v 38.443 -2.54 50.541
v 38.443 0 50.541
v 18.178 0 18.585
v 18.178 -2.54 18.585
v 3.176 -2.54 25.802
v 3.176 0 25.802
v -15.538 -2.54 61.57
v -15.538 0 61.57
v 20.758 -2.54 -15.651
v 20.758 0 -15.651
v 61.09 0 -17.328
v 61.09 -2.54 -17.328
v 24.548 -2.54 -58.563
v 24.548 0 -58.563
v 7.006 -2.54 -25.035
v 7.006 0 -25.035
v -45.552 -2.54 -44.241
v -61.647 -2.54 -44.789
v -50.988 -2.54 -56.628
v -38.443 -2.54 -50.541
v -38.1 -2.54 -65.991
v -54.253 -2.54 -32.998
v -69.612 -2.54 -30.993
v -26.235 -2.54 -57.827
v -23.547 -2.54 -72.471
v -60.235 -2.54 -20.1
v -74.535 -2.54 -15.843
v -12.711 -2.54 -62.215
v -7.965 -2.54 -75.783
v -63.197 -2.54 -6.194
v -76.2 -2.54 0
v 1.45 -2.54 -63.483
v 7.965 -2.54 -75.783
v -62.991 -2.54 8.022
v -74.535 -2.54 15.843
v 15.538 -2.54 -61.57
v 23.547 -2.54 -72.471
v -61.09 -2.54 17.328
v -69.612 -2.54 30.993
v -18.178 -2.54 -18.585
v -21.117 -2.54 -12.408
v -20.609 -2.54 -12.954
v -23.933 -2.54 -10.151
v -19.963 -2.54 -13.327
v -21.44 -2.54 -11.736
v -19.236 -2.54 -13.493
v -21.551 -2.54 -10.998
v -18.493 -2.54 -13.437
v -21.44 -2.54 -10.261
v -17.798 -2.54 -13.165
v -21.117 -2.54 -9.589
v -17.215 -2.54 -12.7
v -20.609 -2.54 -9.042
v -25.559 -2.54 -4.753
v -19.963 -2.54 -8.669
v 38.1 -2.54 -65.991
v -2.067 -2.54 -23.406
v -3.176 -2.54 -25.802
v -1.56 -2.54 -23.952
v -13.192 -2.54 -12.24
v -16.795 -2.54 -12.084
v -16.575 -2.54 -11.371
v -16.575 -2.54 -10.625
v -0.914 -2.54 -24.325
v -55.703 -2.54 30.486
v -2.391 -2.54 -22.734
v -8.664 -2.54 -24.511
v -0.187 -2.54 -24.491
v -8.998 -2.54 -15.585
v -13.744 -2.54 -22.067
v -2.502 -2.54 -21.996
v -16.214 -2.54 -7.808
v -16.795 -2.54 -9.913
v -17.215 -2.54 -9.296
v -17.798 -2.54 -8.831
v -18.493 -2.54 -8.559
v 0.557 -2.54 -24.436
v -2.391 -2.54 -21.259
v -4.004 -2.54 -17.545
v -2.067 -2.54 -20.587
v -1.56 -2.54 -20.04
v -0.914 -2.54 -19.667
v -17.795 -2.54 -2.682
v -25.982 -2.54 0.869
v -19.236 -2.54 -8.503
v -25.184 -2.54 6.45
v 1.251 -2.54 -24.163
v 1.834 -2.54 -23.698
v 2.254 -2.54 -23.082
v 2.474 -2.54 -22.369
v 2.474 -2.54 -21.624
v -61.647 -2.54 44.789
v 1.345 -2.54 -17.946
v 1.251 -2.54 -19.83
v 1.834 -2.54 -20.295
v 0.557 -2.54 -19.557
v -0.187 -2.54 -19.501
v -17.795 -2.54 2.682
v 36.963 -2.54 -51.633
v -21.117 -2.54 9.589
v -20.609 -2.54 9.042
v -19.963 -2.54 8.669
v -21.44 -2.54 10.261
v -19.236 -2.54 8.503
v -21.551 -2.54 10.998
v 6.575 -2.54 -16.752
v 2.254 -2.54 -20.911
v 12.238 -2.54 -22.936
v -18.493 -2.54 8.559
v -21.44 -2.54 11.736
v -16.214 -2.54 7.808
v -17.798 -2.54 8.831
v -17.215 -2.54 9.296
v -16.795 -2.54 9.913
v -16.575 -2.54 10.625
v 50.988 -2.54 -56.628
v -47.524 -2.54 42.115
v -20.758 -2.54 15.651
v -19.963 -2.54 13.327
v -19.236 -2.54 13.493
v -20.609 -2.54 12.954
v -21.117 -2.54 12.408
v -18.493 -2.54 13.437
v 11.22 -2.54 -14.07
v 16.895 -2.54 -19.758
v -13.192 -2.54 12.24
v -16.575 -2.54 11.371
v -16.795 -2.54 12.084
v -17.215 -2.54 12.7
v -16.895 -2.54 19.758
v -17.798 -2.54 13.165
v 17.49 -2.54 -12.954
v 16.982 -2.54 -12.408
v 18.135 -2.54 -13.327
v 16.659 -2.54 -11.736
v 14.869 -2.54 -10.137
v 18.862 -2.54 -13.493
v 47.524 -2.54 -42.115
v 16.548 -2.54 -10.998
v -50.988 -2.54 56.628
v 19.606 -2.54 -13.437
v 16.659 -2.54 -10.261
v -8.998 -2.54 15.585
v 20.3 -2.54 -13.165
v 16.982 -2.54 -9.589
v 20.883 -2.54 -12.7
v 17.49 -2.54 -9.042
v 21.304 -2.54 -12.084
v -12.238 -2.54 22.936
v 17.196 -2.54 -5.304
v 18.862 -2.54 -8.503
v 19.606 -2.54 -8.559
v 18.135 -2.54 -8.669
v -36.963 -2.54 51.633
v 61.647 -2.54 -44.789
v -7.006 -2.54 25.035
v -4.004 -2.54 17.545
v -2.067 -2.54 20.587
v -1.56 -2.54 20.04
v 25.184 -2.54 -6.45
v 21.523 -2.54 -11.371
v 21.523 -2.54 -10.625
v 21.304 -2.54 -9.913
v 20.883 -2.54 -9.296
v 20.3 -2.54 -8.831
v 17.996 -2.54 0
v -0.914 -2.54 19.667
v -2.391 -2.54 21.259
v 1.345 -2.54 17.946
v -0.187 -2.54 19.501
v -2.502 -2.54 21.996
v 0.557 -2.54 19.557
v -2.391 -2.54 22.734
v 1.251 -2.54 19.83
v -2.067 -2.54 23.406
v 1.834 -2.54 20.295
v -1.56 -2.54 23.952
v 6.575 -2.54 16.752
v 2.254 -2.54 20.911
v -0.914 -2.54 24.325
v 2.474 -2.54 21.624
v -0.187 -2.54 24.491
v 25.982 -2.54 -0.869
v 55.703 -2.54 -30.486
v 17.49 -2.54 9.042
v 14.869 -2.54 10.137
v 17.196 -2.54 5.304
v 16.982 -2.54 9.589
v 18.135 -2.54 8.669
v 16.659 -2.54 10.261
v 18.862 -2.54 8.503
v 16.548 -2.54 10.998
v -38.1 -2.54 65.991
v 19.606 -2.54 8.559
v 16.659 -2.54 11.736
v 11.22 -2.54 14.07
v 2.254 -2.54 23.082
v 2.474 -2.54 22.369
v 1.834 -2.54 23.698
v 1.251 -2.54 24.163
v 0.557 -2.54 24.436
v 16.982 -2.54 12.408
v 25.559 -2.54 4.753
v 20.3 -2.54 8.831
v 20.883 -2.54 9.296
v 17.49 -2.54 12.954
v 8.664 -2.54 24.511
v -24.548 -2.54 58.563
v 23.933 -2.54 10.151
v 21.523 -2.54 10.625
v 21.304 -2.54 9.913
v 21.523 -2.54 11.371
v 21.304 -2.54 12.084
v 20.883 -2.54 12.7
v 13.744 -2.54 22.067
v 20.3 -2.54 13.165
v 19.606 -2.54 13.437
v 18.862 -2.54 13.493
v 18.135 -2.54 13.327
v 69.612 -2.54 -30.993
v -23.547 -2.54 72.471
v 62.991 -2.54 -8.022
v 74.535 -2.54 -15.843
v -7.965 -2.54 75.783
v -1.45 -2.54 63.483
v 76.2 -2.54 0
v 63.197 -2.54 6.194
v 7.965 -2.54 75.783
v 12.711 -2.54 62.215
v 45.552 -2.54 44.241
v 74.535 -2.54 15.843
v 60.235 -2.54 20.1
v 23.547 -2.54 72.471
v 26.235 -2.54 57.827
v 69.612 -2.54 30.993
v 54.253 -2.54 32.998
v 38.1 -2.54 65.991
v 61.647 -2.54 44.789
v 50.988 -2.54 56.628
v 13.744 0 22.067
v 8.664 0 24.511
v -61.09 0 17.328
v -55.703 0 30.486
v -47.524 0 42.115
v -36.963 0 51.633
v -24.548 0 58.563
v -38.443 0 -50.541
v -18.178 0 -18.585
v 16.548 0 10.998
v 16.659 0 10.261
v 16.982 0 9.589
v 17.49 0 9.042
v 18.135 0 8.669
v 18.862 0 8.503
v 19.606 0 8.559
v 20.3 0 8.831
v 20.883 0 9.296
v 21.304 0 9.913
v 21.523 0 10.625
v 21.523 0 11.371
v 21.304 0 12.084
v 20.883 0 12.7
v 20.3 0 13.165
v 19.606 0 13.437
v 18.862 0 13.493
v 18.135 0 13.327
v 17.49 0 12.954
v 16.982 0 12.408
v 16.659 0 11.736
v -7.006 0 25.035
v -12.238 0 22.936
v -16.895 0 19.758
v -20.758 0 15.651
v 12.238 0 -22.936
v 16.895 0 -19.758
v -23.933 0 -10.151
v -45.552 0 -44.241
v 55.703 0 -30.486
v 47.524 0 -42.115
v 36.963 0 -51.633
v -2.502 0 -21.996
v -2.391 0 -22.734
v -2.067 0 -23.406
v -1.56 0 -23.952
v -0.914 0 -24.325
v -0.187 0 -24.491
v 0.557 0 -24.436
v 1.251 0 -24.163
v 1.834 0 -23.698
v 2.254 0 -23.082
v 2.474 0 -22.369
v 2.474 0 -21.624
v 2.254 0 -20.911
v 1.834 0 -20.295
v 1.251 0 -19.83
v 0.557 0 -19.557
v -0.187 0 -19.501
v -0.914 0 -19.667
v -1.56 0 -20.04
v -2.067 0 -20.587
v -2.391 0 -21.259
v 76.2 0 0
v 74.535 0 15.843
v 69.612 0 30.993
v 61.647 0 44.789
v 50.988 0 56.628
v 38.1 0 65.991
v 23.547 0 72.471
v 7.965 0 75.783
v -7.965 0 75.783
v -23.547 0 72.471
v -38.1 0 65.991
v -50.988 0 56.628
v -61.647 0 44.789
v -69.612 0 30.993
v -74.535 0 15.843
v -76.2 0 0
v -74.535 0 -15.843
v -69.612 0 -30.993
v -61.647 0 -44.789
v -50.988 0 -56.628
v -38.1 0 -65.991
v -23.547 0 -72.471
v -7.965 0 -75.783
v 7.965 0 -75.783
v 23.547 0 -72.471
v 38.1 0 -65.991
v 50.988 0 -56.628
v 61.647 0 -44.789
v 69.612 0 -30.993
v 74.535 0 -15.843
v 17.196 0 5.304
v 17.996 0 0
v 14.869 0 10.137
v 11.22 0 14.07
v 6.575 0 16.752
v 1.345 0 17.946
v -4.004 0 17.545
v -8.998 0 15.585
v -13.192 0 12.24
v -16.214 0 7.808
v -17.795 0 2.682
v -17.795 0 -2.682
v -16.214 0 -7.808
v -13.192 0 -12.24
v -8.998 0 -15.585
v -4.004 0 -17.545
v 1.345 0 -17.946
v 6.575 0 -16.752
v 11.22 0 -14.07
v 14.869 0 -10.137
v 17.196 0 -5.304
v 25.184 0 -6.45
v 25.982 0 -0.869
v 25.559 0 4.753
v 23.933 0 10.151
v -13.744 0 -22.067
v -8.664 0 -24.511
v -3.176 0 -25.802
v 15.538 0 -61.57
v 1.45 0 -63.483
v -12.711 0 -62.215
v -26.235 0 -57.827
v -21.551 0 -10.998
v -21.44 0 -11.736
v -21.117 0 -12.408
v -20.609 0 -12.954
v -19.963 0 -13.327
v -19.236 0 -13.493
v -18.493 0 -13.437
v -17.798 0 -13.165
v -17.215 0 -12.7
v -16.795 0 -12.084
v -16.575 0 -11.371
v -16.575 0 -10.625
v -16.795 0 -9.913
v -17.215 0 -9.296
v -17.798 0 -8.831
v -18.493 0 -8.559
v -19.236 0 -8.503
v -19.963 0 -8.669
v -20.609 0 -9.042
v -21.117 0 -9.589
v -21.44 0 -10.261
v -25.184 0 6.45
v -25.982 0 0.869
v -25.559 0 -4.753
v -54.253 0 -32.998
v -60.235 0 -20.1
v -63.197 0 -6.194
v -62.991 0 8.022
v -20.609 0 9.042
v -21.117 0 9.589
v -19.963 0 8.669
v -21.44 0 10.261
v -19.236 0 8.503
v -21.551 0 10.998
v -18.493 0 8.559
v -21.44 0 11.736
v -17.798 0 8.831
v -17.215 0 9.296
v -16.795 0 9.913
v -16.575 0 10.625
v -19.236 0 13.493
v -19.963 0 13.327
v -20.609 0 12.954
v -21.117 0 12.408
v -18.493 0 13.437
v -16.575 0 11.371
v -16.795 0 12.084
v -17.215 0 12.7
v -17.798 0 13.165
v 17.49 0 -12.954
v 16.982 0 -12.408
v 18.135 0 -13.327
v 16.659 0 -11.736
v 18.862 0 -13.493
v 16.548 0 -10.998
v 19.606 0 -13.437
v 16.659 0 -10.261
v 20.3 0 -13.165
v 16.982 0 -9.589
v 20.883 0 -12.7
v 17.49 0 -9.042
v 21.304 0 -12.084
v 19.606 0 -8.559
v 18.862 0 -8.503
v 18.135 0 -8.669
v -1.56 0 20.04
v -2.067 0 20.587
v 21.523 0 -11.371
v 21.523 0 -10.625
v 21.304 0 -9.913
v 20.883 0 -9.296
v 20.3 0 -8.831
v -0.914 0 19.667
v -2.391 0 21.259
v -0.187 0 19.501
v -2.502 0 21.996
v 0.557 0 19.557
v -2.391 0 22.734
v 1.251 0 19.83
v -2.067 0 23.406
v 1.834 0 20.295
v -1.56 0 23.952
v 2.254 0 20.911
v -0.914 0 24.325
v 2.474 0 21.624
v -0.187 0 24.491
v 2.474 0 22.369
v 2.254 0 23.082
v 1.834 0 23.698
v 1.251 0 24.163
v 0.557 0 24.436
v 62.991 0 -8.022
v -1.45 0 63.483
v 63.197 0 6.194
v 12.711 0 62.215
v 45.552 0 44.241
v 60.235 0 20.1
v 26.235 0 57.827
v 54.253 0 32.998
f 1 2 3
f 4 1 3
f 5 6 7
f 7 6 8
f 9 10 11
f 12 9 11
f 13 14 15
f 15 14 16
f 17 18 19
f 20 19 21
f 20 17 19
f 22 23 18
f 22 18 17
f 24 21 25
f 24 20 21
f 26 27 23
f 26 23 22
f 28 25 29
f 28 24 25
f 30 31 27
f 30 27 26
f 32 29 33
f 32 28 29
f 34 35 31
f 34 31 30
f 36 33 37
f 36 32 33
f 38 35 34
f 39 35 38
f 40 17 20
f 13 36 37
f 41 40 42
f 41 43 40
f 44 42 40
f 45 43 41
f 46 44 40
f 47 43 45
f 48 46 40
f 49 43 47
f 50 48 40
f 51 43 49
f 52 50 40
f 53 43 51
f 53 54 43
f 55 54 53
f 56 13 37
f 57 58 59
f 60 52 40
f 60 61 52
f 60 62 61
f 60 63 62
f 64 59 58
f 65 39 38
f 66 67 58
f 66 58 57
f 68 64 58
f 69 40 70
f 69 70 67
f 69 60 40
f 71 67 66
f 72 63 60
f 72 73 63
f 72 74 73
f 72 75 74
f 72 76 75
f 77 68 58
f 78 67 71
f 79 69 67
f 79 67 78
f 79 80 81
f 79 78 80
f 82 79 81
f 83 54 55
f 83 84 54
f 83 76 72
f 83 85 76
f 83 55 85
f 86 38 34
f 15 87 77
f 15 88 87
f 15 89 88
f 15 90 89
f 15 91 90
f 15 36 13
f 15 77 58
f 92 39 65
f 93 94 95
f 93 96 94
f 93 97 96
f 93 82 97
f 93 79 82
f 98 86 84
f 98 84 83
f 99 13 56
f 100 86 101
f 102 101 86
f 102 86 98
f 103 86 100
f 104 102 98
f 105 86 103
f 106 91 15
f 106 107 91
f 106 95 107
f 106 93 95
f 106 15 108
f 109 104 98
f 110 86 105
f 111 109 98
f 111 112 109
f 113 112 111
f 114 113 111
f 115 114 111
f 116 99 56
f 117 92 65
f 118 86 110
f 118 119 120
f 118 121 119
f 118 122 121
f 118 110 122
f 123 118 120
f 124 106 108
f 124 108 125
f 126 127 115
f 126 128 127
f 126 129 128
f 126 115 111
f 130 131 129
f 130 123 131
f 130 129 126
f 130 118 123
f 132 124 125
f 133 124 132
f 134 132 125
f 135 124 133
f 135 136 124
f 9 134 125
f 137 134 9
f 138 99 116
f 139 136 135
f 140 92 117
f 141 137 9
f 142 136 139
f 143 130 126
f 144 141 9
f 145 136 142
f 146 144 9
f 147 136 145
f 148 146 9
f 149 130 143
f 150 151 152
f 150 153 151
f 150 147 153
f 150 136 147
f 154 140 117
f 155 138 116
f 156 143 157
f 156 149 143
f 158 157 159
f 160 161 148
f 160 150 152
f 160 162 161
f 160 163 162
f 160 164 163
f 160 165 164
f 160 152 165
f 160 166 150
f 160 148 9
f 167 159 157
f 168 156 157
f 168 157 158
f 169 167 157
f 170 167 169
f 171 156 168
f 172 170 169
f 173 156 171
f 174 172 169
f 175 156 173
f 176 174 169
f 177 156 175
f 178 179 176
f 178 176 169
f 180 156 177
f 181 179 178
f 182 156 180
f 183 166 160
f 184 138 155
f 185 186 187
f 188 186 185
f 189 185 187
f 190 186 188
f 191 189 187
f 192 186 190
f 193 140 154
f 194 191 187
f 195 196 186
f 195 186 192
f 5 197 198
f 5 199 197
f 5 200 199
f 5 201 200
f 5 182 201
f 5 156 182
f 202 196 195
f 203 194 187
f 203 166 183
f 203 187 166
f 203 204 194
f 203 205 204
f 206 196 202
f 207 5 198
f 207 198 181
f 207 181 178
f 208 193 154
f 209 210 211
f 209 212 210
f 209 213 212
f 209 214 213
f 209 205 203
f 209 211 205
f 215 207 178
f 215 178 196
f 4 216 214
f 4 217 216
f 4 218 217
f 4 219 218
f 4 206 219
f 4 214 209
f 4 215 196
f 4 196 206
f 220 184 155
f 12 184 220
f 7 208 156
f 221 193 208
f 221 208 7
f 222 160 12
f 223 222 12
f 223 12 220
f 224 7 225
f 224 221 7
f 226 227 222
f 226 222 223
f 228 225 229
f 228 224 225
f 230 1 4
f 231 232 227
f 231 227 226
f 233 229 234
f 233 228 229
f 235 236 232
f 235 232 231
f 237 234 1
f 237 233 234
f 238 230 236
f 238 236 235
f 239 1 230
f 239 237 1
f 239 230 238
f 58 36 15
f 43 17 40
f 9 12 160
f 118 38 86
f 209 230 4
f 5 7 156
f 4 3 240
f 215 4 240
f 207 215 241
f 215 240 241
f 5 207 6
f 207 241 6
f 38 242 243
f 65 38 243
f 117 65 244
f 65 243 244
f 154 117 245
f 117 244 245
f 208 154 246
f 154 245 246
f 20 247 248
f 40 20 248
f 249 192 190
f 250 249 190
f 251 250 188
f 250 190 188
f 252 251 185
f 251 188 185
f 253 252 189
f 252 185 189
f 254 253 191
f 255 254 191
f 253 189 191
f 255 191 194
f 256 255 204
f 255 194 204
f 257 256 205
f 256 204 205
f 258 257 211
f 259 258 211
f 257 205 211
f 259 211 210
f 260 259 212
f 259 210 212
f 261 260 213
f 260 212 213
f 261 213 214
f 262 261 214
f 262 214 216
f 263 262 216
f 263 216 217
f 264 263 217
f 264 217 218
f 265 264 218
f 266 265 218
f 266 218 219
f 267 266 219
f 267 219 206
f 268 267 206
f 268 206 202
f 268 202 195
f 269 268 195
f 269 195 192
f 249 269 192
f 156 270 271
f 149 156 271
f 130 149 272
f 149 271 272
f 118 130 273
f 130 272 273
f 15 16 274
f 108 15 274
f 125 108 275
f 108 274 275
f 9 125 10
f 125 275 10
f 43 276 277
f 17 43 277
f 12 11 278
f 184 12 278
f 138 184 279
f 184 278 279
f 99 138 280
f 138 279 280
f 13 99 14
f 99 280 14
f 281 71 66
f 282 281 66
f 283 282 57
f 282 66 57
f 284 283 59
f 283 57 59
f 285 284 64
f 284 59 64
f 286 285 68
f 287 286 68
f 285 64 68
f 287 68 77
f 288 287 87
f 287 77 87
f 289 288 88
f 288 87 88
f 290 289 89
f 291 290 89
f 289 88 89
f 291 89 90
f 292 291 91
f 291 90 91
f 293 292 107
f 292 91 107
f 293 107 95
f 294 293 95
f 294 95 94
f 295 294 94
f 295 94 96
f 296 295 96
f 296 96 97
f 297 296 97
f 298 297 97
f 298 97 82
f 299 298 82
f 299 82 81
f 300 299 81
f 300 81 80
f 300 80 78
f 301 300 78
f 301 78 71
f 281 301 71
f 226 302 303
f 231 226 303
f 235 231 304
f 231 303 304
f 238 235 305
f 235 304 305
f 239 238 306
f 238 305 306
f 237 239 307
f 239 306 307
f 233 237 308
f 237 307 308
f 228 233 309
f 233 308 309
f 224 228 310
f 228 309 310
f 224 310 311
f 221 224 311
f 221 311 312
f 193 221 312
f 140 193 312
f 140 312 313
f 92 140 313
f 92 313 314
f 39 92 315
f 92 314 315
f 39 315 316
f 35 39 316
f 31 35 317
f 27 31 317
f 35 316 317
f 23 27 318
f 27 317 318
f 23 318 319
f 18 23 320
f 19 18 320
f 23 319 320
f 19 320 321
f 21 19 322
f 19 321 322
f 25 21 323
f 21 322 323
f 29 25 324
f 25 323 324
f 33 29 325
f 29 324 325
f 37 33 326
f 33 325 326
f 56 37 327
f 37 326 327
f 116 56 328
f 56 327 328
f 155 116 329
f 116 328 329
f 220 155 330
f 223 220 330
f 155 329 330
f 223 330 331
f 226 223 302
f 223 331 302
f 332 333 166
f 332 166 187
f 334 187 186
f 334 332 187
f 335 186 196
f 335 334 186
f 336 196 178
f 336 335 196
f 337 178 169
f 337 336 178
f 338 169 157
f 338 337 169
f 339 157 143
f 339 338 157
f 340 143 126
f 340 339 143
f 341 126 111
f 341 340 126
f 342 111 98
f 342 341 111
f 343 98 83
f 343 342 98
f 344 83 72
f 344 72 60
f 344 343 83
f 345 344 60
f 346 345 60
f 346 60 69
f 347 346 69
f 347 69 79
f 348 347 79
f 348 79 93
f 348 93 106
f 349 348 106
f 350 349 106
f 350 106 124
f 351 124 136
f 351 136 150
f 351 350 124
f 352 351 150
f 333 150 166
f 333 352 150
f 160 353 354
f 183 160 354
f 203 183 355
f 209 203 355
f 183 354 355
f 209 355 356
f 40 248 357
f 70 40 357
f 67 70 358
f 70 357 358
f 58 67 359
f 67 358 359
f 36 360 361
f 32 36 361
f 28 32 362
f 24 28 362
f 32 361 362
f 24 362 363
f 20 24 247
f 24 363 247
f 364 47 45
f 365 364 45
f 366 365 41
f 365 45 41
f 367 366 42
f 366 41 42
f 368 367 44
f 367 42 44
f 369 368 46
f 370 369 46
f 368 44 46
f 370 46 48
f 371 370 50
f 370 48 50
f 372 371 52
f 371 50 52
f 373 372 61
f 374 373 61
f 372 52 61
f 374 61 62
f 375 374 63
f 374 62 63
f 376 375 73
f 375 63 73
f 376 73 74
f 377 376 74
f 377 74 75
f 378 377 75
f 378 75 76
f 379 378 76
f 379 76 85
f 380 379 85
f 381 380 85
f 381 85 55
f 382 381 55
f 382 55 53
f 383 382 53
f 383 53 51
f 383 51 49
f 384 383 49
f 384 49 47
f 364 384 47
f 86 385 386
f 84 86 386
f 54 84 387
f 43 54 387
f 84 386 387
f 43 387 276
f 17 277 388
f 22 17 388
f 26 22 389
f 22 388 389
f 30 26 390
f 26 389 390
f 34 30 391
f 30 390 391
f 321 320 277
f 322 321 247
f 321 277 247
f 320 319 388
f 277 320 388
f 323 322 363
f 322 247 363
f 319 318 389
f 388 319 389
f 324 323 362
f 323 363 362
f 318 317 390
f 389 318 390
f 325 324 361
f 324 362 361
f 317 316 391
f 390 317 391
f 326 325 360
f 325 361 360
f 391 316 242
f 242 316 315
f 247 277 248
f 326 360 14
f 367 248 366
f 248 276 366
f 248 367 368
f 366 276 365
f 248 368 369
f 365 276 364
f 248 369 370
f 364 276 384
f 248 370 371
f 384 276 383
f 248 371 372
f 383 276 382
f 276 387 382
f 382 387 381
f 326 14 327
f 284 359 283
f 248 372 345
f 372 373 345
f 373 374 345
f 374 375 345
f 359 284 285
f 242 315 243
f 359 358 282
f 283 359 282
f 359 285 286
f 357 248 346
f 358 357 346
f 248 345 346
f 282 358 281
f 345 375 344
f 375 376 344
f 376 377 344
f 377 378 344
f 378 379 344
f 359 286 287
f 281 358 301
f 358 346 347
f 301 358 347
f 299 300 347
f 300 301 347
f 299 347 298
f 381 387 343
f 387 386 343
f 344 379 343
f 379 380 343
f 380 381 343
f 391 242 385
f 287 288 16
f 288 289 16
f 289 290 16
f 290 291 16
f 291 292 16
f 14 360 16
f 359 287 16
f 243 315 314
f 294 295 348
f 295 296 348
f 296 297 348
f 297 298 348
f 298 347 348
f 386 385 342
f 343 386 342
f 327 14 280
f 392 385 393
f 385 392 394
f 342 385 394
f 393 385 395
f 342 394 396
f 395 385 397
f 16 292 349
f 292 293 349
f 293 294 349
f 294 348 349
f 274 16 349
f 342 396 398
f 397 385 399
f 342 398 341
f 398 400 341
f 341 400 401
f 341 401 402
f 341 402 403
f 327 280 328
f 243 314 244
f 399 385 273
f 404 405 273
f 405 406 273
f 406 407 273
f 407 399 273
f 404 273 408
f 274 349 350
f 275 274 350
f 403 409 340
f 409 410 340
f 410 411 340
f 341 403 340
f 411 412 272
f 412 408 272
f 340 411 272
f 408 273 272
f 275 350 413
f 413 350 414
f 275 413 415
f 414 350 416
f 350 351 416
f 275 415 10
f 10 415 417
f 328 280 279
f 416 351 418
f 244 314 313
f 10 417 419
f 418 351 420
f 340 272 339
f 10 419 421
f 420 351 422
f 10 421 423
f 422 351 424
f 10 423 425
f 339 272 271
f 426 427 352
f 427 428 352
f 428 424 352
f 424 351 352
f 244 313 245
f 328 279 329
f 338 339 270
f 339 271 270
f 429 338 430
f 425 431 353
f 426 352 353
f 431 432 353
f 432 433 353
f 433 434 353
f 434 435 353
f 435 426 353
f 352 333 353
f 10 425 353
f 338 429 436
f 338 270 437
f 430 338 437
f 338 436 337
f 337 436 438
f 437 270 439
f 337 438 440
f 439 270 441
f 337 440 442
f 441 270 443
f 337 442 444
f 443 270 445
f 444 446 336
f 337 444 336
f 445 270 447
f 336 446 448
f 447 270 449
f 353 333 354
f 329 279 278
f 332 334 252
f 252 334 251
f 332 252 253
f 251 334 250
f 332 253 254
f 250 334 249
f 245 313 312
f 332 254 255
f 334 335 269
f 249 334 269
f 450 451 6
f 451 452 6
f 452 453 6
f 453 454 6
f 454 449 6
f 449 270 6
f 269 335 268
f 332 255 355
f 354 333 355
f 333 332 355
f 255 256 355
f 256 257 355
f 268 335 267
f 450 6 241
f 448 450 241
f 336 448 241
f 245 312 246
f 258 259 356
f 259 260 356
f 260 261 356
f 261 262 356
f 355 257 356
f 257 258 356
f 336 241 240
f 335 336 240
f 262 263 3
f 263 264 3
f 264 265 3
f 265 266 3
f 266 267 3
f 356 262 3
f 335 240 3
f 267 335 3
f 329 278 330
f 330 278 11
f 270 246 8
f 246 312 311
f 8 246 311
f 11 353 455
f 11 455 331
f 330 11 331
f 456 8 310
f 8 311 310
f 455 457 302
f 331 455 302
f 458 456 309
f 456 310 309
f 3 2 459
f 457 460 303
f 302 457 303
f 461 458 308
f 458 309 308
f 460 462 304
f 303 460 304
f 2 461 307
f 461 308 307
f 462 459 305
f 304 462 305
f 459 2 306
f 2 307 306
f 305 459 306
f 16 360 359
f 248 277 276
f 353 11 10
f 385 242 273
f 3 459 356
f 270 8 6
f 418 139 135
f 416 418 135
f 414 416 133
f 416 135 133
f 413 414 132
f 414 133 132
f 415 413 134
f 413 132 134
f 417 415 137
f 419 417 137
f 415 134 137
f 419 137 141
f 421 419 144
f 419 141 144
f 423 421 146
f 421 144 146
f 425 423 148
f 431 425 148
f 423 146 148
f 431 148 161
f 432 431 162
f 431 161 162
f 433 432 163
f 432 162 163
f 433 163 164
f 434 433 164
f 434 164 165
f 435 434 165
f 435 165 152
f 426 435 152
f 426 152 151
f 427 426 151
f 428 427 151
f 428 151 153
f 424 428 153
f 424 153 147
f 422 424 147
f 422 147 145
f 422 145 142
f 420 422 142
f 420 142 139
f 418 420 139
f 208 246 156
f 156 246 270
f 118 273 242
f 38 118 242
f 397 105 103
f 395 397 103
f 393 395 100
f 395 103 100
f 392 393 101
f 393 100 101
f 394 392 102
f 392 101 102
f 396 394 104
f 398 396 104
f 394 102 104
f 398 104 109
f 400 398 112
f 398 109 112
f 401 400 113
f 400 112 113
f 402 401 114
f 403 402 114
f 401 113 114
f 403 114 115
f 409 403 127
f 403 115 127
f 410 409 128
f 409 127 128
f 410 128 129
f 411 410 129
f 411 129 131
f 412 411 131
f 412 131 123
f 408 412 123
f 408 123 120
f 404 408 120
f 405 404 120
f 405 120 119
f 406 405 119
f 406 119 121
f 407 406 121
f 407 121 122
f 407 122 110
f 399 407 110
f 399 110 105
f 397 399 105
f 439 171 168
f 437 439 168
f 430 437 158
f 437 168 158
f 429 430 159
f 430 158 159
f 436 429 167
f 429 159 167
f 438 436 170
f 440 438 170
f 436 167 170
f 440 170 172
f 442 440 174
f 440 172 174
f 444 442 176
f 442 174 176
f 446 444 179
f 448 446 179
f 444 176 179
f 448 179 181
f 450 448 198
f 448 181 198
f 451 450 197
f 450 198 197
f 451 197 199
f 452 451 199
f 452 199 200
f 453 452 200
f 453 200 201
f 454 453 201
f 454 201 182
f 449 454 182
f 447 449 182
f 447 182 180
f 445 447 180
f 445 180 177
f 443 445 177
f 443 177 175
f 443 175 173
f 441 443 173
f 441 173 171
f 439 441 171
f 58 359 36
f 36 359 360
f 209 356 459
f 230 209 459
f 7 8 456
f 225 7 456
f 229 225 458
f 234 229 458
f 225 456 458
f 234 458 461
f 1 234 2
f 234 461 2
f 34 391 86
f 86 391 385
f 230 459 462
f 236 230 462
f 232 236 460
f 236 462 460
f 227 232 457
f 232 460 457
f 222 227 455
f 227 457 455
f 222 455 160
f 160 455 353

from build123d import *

# Parameters (mm, degrees)
F1_R     = 76.2
F1_R_2   = 17.9959
F2_DEPTH = 2.54
F0_D     = 5.0038


with BuildPart() as f2:
    # F1 (on Front) → F2 (new body)
    with BuildSketch(Plane.XZ):
        Circle(F1_R)
        with BuildLine():
            Line((-38.44313, -50.540833), (-18.178202, -18.584719))
            ThreePointArc((-18.178202, -18.584719), (-11.270308, -23.426886), (-3.175655, -25.80221))
            Line((-3.175655, -25.80221), (15.538346, -61.569553))
            ThreePointArc((15.538346, -61.569553), (-12.710839, -62.214826), (-38.44313, -50.540833))
        make_face(mode=Mode.SUBTRACT)
        with BuildLine():
            Line((-62.99121, 8.02231), (-25.18394, 6.450426))
            ThreePointArc((-25.18394, 6.450426), (-25.923432, -1.95307), (-23.933196, -10.150907))
            Line((-23.933196, -10.150907), (-45.551624, -44.241379))
            ThreePointArc((-45.551624, -44.241379), (-60.235039, -20.099503), (-62.99121, 8.02231))
        make_face(mode=Mode.SUBTRACT)
        with BuildLine():
            Line((24.54808, -58.563143), (7.005737, -25.035144))
            ThreePointArc((7.005737, -25.035144), (14.653124, -21.473816), (20.757542, -15.651302))
            Line((20.757542, -15.651302), (61.08997, -17.328174))
            ThreePointArc((61.08997, -17.328174), (47.5242, -42.115323), (24.54808, -58.563143))
        make_face(mode=Mode.SUBTRACT)
        with BuildLine():
            ThreePointArc((-61.08997, 17.328174), (-47.5242, 42.115323), (-24.54808, 58.563143))
            Line((-24.54808, 58.563143), (-7.005737, 25.035144))
            ThreePointArc((-7.005737, 25.035144), (-14.653124, 21.473816), (-20.757542, 15.651302))
            Line((-20.757542, 15.651302), (-61.08997, 17.328174))
        make_face(mode=Mode.SUBTRACT)
        Circle(F1_R_2, mode=Mode.SUBTRACT)
        with BuildLine():
            Line((62.99121, -8.02231), (25.18394, -6.450426))
            ThreePointArc((25.18394, -6.450426), (25.923432, 1.95307), (23.933196, 10.150907))
            Line((23.933196, 10.150907), (45.551624, 44.241379))
            ThreePointArc((45.551624, 44.241379), (60.235039, 20.099503), (62.99121, -8.02231))
        make_face(mode=Mode.SUBTRACT)
        with BuildLine():
            ThreePointArc((18.178202, 18.584719), (11.270308, 23.426886), (3.175655, 25.80221))
            Line((3.175655, 25.80221), (-15.538346, 61.569553))
            ThreePointArc((-15.538346, 61.569553), (12.710839, 62.214826), (38.44313, 50.540833))
            Line((38.44313, 50.540833), (18.178202, 18.584719))
        make_face(mode=Mode.SUBTRACT)
    extrude(amount=F2_DEPTH)

    # F0 (through all)
    with Locations(Plane(origin=(0, 0, 0), x_dir=(1, 0, 0), z_dir=(0, 1, 0))):
        with Locations((19.049441, 10.9982), (19.049441, -10.9982), (0, -21.9964), (-19.049441, -10.9982), (-19.049441, 10.9982), (0, 21.9964)):
            Hole(F0_D / 2)


solid = f2.part
